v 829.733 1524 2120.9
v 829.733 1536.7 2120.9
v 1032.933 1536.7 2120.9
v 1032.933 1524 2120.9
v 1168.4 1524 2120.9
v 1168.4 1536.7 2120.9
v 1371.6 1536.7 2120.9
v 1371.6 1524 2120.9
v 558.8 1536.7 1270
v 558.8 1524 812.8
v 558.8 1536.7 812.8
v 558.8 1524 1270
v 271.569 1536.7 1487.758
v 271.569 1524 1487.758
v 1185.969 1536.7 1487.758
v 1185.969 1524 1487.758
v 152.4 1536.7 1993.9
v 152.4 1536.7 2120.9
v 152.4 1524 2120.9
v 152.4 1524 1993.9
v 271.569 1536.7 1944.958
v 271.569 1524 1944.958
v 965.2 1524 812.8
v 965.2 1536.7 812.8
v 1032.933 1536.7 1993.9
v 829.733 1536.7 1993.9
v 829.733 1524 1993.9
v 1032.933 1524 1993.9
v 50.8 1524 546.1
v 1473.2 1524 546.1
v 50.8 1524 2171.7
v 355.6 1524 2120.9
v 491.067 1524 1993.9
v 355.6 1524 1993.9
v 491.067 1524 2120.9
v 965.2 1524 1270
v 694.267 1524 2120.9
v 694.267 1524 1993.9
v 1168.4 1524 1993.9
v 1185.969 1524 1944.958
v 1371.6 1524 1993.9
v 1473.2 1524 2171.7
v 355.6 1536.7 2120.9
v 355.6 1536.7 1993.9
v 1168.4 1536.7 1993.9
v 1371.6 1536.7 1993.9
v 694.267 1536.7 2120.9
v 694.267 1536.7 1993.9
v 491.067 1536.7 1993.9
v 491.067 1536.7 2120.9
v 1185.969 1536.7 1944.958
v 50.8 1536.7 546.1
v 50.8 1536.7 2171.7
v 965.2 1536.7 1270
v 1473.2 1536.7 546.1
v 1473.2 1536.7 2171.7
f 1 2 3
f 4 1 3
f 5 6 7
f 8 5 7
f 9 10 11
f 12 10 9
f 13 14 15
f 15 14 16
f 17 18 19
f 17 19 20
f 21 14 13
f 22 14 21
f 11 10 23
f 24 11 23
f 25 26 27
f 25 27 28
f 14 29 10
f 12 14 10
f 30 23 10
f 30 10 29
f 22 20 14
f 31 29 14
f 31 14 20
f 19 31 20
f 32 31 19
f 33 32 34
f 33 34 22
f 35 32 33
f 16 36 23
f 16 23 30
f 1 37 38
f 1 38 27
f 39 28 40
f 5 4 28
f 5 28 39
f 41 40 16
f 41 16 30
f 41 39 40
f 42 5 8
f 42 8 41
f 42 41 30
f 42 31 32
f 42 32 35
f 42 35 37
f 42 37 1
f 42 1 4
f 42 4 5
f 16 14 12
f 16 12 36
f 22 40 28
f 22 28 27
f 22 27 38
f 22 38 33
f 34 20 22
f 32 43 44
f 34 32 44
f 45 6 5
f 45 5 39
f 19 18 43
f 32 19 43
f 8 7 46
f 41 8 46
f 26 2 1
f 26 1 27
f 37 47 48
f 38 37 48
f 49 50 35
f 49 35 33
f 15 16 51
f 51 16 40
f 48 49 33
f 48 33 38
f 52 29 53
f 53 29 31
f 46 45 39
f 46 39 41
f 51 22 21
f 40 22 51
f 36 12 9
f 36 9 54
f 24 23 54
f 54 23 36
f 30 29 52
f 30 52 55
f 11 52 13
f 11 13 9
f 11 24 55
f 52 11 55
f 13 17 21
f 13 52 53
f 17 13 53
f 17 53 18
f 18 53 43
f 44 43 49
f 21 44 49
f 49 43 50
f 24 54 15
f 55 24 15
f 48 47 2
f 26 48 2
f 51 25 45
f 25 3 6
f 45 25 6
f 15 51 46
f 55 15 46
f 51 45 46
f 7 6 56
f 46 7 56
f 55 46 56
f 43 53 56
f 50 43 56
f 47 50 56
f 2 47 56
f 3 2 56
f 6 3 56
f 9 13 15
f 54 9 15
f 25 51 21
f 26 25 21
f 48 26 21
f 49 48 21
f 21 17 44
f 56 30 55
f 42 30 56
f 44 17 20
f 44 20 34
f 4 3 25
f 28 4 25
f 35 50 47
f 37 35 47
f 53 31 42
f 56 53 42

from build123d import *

# Parameters (mm, degrees)
SKETCH023_W            = 1422.4
SKETCH023_H            = 1625.6
SKETCH023_W_2          = 406.4
SKETCH023_H_2          = 457.2
SKETCH023_W_3          = 914.4
PAD004_DEPTH           = 12.7
SKETCH024_W            = 203.2
SKETCH024_H            = 127
POCKET019_DEPTH        = 12.7010000028
LINEARPATTERN001_COUNT = 4
LINEARPATTERN001_PITCH = 338.6666666667


with BuildPart() as part:
    # Sketch023 → Pad004 (new body)
    with BuildSketch(Plane(origin=(0, 1524, 0), x_dir=(1, 0, 0), z_dir=(0, -1, 0))):
        with Locations((762, 1358.9)):
            Rectangle(SKETCH023_W, SKETCH023_H)
        with Locations((762, 1041.4)):
            Rectangle(SKETCH023_W_2, SKETCH023_H_2, mode=Mode.SUBTRACT)
        with Locations((728.768672, 1716.358264)):
            Rectangle(SKETCH023_W_3, SKETCH023_H_2, mode=Mode.SUBTRACT)
    extrude(amount=-PAD004_DEPTH)

    # Sketch024 → Pocket019 (cut, through all)
    with BuildSketch(Plane(origin=(0, 1536.7, 0), x_dir=(1, 0, 0), z_dir=(0, 1, 0))):
        with Locations((254, -2057.4)):
            Rectangle(SKETCH024_W, SKETCH024_H)
    pocket019 = extrude(amount=-POCKET019_DEPTH, mode=Mode.SUBTRACT)

    # LinearPattern001: Pocket019 ×4
    with Locations(*[(i * LINEARPATTERN001_PITCH, 0, 0) for i in range(1, LINEARPATTERN001_COUNT)]):
        add(pocket019, mode=Mode.SUBTRACT)


solid = part.part
